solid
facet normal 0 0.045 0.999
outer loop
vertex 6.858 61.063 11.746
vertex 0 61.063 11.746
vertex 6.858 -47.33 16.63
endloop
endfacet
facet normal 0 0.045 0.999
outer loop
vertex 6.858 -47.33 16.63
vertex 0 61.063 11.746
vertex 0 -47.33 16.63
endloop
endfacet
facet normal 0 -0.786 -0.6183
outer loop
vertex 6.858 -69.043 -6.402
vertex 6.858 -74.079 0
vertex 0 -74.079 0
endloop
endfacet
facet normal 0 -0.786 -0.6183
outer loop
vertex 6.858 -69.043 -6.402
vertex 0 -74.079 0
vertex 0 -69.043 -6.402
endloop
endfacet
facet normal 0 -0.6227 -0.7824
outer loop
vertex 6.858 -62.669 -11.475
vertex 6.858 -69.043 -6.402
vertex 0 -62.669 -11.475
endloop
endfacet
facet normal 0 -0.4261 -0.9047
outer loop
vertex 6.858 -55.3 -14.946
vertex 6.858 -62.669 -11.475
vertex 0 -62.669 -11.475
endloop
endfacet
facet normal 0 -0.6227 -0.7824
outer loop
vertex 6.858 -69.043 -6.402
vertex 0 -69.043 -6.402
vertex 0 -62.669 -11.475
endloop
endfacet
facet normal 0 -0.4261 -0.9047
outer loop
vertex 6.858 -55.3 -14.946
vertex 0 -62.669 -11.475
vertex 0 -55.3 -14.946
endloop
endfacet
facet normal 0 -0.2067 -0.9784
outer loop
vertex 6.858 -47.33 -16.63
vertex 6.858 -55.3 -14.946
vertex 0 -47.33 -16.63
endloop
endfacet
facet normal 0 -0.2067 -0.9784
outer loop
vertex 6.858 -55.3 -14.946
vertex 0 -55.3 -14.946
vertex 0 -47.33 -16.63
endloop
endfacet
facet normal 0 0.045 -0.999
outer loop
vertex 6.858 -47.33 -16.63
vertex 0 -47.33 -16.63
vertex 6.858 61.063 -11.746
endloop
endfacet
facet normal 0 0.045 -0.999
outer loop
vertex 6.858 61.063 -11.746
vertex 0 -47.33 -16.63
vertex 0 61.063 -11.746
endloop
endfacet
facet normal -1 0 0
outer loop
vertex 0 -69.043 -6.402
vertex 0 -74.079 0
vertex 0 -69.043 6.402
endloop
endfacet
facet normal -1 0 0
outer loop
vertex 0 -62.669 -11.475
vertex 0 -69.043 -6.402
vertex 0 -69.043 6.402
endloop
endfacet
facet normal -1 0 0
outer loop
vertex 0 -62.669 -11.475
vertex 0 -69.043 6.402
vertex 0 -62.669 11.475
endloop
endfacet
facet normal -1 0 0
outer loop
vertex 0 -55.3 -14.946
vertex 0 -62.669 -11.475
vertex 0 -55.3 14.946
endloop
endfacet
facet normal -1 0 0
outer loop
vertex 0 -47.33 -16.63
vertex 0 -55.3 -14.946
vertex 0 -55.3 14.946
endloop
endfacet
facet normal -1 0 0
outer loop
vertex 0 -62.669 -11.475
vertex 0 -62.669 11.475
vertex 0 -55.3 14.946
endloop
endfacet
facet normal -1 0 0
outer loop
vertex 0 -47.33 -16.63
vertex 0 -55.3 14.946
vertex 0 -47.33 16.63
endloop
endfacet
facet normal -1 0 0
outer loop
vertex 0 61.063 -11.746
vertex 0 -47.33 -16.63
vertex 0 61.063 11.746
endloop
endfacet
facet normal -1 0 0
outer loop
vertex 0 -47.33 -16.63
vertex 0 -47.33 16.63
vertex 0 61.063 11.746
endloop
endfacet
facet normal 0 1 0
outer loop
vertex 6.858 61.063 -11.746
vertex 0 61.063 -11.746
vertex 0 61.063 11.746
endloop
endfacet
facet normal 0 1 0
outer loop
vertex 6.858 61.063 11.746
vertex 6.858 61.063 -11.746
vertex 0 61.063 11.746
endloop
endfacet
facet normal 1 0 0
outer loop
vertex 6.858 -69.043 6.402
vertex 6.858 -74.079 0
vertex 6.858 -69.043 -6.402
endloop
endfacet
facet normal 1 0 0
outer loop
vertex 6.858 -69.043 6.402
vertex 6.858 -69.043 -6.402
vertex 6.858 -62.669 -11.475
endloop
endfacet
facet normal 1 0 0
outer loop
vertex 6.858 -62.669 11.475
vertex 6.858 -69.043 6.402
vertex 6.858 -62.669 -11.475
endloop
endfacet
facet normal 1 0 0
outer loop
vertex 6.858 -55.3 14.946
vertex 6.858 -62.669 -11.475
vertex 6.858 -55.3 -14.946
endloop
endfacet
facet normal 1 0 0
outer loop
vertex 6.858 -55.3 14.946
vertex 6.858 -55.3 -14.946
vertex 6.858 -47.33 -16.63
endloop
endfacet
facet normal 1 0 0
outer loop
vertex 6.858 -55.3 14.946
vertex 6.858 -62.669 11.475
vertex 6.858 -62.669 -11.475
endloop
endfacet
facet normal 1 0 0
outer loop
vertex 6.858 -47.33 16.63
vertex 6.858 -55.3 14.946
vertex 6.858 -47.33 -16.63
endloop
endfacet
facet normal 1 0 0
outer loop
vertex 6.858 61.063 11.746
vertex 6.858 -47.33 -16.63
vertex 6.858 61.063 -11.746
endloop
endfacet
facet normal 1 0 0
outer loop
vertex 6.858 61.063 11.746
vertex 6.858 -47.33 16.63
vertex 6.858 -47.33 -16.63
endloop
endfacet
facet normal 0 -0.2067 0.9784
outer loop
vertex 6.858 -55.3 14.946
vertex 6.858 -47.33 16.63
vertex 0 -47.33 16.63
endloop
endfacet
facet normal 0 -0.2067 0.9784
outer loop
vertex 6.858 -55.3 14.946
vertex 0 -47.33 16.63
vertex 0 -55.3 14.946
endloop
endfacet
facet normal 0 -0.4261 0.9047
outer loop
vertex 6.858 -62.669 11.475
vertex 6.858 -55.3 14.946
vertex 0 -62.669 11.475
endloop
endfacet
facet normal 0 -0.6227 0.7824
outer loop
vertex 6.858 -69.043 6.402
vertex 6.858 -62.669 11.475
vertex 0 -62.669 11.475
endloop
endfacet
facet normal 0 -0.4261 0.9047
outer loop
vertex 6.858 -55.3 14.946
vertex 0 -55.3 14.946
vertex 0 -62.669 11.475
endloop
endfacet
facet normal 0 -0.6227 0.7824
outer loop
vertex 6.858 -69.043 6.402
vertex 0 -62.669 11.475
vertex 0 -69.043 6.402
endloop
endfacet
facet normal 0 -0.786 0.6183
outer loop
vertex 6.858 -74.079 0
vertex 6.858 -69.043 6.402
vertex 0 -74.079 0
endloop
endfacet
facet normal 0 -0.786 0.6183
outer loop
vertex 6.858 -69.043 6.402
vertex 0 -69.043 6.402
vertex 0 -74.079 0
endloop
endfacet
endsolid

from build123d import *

# Parameters (mm, degrees)
F1_DEPTH = 6.858


# Not quite as in the source:
# - the program builds the solid bodies; features that only make, move or delete a surface that nothing else refers to are left out


with BuildPart() as f1:
    # F0 (on Right) → F1 (new body)
    with BuildSketch(Plane.YZ):
        with BuildLine():
            Line((61.0633231699, 11.7456540465), (-47.3298765719, 16.6299846023))
            ThreePointArc((-47.3298765719, 16.6299846023), (-62.6691287871, 11.4749888817), (-74.0792676806, 0))
            Line((-74.0792676806, 0), (61.0633231699, 0))
            Line((61.0633231699, 0), (61.0633231699, 11.7456540465))
        make_face()
        with BuildLine():
            Line((61.0633231699, 0), (-74.0792676806, 0))
            ThreePointArc((-74.0792676806, 0), (-62.6691287871, -11.4749888817), (-47.3298765719, -16.6299846023))
            Line((-47.3298765719, -16.6299846023), (61.0633231699, -11.7456540465))
            Line((61.0633231699, -11.7456540465), (61.0633231699, 0))
        make_face()
    extrude(amount=F1_DEPTH)


solid = f1.part
